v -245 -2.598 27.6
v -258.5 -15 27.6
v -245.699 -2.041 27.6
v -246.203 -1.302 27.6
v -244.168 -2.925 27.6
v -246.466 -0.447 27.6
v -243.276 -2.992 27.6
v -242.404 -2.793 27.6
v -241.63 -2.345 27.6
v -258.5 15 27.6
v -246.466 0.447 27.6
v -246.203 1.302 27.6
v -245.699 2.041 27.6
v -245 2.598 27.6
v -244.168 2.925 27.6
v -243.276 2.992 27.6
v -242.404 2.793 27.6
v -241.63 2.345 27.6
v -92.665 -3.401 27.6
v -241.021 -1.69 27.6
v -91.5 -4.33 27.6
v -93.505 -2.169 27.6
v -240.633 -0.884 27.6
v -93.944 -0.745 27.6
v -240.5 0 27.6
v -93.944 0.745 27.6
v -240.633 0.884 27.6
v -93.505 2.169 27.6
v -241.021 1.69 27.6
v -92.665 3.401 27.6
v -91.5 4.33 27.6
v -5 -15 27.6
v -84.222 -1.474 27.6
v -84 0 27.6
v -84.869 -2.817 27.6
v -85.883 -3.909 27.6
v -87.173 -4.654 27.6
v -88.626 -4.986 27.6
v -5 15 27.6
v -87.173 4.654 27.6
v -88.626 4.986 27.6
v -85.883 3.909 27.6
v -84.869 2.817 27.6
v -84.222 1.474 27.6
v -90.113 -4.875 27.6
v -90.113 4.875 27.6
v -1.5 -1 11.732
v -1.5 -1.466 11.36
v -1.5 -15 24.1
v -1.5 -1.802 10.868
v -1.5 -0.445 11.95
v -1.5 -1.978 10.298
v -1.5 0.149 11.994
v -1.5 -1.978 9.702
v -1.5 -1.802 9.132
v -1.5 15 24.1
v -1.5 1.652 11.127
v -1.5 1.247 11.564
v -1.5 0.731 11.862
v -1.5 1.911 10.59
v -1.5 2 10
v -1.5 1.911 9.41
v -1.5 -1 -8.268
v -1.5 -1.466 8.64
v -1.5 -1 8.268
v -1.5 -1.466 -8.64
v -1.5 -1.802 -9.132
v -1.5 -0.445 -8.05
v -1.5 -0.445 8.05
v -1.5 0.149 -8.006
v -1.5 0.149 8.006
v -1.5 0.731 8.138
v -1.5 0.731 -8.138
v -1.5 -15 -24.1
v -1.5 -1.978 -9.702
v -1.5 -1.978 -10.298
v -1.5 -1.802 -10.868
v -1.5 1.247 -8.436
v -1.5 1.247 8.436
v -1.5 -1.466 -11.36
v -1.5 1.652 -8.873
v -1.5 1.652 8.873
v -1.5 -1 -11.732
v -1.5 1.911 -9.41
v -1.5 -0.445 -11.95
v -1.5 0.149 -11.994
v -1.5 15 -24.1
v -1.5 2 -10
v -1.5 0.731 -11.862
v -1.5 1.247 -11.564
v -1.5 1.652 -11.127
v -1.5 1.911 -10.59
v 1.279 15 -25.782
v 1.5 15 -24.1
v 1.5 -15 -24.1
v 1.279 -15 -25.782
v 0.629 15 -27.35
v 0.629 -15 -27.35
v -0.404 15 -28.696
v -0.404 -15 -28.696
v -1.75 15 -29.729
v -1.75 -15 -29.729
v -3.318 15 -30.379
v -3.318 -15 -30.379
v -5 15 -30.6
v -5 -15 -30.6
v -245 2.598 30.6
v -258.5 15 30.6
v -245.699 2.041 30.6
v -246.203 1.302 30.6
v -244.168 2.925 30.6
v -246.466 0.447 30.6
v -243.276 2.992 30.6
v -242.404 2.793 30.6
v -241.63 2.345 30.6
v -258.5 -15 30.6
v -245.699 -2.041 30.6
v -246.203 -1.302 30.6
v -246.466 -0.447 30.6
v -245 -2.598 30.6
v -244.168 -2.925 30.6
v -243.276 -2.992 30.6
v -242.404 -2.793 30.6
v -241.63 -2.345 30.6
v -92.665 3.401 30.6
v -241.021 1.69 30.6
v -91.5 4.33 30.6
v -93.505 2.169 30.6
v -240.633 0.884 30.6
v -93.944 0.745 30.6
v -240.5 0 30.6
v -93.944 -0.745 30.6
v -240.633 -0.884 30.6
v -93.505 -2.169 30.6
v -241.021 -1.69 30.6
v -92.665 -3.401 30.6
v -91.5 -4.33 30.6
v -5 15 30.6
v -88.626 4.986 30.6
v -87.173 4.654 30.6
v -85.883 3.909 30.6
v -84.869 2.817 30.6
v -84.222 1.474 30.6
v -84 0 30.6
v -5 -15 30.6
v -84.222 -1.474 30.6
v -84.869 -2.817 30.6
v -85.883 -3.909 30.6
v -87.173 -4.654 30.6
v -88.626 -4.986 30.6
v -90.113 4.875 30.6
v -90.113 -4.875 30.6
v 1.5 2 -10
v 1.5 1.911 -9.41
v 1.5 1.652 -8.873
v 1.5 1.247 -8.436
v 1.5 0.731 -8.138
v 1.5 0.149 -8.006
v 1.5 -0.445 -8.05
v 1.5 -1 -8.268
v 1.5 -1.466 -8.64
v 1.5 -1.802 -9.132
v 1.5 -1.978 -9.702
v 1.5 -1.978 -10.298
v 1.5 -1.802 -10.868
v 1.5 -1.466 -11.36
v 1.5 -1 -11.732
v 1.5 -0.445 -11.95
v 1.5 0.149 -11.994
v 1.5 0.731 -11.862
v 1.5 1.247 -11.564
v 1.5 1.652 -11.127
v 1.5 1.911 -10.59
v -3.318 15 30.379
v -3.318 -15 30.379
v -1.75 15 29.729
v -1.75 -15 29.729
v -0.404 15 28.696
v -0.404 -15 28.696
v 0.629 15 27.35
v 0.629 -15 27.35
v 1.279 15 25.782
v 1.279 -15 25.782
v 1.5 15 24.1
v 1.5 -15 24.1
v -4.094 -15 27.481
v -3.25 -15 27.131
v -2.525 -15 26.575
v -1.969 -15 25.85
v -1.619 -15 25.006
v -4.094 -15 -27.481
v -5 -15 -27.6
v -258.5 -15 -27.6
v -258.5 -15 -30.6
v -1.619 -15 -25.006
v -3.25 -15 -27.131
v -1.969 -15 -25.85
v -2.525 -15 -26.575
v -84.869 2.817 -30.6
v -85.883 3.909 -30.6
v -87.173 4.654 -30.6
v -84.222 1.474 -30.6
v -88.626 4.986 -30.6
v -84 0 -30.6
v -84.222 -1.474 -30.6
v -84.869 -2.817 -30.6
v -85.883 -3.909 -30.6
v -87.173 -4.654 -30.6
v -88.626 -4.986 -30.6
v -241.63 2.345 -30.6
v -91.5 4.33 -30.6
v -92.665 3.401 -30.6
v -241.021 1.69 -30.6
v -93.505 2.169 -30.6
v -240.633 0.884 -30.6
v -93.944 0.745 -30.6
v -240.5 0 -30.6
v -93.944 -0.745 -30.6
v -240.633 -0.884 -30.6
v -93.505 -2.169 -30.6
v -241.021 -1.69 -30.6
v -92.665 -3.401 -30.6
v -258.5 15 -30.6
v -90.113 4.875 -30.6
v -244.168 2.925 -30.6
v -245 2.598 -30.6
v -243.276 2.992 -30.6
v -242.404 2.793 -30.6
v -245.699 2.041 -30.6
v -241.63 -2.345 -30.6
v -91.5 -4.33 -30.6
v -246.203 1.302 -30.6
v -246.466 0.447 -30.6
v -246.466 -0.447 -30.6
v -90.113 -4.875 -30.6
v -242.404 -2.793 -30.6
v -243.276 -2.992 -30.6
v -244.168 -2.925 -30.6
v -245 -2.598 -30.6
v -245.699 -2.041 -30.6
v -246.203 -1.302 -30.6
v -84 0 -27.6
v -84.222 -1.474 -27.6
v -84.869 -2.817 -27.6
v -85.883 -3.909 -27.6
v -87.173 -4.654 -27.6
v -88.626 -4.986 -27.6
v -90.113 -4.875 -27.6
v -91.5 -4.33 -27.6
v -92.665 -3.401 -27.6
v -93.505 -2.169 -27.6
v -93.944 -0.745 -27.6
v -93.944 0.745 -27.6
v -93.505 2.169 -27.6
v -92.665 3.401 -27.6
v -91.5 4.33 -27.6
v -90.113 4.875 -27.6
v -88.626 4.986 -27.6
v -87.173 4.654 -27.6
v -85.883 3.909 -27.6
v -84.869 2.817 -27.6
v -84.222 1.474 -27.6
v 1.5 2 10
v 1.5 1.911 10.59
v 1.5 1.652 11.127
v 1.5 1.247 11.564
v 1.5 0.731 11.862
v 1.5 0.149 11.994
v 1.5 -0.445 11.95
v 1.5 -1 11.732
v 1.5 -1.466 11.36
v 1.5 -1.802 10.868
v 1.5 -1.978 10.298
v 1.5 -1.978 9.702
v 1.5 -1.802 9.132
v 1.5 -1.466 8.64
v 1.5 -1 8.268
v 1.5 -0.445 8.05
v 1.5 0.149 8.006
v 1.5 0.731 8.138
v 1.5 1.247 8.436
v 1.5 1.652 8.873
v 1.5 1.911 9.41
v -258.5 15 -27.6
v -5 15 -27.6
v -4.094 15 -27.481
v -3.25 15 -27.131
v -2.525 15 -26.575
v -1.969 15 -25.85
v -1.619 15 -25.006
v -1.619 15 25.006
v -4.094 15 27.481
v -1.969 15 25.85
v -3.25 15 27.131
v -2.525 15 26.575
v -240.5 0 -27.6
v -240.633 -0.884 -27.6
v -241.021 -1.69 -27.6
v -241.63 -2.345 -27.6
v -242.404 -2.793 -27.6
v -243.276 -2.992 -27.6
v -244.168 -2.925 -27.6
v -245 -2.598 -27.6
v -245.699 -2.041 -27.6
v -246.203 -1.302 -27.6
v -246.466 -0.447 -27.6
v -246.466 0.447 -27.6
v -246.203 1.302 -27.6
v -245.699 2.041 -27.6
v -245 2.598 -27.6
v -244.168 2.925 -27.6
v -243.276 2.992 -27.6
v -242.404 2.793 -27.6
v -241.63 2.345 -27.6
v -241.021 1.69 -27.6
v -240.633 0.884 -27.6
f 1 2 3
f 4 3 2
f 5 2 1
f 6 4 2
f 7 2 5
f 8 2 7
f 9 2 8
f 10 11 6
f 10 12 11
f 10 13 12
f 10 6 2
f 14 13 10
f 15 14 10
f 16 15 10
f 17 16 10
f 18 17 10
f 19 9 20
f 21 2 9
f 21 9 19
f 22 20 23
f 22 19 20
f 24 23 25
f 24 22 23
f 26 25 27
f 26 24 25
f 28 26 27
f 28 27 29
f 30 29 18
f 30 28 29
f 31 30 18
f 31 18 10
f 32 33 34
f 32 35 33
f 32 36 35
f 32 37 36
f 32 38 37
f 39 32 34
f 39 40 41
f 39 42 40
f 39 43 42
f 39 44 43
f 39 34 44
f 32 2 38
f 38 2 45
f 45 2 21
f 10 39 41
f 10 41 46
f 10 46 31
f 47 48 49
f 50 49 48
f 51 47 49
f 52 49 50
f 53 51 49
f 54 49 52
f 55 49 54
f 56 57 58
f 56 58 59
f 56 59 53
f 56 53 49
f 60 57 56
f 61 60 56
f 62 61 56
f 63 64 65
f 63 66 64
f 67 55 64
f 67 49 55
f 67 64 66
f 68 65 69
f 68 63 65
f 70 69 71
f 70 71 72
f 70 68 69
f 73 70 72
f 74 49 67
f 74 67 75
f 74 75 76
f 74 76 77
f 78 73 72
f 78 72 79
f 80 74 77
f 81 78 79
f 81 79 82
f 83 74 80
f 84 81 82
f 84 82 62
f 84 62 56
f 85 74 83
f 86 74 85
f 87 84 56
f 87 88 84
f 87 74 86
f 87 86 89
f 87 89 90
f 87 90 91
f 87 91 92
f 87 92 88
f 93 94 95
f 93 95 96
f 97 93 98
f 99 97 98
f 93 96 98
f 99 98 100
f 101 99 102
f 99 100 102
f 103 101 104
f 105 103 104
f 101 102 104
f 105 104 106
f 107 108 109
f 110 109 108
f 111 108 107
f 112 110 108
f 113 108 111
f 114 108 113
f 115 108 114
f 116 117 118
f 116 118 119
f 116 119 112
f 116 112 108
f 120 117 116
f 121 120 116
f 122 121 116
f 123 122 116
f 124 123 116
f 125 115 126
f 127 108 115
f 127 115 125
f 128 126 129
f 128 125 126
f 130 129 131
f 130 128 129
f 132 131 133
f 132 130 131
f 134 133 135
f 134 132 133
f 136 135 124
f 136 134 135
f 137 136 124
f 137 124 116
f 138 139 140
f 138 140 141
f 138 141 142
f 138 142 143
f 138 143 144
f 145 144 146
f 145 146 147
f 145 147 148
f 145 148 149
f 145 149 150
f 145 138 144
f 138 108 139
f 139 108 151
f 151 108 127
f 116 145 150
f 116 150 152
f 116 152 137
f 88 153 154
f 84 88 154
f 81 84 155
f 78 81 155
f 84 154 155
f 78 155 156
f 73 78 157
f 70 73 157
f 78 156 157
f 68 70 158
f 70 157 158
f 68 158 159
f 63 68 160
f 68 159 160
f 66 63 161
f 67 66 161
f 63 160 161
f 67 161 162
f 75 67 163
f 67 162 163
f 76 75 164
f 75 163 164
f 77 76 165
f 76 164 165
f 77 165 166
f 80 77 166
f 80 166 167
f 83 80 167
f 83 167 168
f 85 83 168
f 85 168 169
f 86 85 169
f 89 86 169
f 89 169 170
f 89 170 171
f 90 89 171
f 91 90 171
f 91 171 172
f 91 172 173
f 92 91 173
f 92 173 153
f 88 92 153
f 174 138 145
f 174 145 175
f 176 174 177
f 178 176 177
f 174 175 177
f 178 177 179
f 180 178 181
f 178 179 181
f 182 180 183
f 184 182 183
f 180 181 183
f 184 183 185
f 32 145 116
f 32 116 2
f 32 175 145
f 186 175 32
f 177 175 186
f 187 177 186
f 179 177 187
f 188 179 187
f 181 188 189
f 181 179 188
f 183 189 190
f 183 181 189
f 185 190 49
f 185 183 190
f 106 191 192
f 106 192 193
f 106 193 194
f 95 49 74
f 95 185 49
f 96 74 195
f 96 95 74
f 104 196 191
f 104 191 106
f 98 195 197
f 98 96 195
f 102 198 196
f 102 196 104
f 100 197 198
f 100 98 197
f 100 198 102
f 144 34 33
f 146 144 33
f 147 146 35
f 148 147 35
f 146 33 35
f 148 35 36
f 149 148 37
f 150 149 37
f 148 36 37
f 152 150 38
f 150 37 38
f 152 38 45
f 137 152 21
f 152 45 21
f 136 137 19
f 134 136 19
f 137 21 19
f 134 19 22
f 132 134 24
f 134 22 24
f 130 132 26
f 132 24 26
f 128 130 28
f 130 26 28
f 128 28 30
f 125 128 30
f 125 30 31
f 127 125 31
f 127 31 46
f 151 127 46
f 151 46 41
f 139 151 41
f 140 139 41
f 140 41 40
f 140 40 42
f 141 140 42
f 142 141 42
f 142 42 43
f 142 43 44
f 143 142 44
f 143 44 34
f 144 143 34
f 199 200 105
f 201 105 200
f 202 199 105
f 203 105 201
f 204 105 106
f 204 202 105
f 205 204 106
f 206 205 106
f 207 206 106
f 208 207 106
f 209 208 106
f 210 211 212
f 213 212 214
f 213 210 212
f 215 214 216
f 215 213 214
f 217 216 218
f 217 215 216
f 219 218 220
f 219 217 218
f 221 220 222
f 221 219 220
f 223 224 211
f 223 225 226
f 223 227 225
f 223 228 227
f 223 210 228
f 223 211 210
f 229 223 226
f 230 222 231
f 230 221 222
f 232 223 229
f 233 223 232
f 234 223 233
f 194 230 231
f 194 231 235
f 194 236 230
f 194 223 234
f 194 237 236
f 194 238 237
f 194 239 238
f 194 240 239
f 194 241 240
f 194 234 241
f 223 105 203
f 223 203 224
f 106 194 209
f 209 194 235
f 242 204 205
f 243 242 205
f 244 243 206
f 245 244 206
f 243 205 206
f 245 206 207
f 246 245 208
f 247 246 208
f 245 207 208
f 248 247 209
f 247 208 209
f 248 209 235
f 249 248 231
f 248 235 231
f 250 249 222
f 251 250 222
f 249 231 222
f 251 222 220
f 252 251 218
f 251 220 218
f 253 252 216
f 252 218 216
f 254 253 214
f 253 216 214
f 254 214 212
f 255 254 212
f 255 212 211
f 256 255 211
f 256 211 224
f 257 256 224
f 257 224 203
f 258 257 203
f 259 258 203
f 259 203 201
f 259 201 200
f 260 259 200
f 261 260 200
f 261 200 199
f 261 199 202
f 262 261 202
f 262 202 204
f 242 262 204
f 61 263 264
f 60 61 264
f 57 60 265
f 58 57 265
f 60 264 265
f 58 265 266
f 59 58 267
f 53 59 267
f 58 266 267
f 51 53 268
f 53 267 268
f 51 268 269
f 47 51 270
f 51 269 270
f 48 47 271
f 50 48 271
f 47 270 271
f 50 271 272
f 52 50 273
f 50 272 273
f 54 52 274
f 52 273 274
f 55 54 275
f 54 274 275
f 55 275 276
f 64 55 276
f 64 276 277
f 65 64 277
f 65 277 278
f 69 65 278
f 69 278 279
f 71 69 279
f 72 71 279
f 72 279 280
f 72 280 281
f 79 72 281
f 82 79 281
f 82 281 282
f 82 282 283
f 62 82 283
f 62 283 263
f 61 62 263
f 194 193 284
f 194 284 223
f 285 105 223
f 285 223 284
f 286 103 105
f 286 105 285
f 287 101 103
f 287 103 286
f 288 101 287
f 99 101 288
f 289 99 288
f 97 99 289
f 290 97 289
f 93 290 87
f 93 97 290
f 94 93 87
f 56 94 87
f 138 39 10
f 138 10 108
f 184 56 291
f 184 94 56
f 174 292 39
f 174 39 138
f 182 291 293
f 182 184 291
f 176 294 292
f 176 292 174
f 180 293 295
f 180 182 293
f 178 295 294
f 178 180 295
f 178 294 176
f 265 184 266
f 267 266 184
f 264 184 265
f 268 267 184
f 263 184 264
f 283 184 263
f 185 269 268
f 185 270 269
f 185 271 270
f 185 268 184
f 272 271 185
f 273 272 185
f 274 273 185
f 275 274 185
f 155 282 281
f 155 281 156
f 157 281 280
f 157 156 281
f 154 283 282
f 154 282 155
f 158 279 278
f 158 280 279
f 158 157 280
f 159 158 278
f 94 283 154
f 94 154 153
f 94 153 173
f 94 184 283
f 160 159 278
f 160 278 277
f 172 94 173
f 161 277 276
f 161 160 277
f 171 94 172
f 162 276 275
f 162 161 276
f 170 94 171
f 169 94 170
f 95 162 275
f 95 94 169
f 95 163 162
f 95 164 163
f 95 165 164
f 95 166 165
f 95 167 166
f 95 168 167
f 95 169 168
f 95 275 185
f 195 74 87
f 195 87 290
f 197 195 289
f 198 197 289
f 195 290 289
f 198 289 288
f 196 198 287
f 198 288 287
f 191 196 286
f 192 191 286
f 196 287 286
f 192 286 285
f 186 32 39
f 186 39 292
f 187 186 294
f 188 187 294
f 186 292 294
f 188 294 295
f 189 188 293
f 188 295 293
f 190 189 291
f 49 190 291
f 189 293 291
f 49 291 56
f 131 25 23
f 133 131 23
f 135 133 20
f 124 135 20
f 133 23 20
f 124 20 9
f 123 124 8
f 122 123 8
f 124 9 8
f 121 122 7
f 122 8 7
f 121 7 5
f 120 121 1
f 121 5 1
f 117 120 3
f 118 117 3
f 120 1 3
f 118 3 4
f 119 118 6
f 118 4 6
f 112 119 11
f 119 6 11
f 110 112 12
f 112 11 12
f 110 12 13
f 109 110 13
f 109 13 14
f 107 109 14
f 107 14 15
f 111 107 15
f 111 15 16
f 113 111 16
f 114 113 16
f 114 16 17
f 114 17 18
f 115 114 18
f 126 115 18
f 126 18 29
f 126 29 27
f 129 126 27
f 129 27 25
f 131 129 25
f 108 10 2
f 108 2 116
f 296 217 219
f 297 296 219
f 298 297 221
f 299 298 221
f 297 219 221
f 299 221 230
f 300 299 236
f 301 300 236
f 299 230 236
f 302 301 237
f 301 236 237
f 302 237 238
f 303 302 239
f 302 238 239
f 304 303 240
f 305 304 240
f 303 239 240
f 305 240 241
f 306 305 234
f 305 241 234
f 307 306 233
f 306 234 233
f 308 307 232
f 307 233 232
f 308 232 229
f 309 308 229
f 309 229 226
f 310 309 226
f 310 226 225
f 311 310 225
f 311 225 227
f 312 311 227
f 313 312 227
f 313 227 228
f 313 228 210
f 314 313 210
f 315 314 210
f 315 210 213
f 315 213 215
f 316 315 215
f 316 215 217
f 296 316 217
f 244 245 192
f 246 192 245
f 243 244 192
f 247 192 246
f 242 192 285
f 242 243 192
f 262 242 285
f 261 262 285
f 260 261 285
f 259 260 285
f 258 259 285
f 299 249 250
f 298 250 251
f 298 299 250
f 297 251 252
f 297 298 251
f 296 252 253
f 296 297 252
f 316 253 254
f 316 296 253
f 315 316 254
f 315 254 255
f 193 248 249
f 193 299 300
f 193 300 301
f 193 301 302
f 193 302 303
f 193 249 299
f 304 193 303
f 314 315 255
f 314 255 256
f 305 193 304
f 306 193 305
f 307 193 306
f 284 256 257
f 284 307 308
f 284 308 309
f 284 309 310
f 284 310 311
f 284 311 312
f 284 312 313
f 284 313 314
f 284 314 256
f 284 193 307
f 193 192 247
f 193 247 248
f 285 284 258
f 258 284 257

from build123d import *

# Parameters (mm, degrees)
F2_W     = 30
F2_H     = 3
F4_R     = 5
F5_DEPTH = 61.201
F6_R     = 2
F7_DEPTH = 260.001
F8_R     = 3
F9_DEPTH = 61.201


with BuildPart() as f3:
    # F3: sweep along a path in F0
    with BuildLine(Plane.XZ) as f3_path:
        Line((-258.5, 29.1), (-5, 29.1))
        ThreePointArc((-5, 29.1), (-1.4644660941, 27.6355339059), (0, 24.1))
        Line((0, 24.1), (0, -24.1))
        ThreePointArc((0, -24.1), (-1.4644660941, -27.6355339059), (-5, -29.1))
        Line((-5, -29.1), (-258.5, -29.1))
    # F2 (on plane+point) → F3 (sweep)
    with BuildSketch(Plane.YZ.offset(-258.5)):
        with Locations((0, 29.1)):
            Rectangle(F2_W, F2_H)
    sweep(path=f3_path.line)

    # F4 (on face) → F5 (cut, through all)
    with BuildSketch(Plane(origin=(0, 0, -30.6), x_dir=(1, 0, 0), z_dir=(0, 0, -1))):
        with Locations((-89, 0)):
            Circle(F4_R)
    extrude(amount=-F5_DEPTH, mode=Mode.SUBTRACT)

    # F6 (on face) → F7 (cut, through all)
    with BuildSketch(Plane.YZ.offset(1.5)):
        with Locations((0, 10)):
            Circle(F6_R)
        with Locations((0, -10)):
            Circle(F6_R)
    extrude(amount=-F7_DEPTH, mode=Mode.SUBTRACT)

    # F8 (on face) → F9 (cut, through all)
    with BuildSketch(Plane(origin=(0, 0, -30.6), x_dir=(1, 0, 0), z_dir=(0, 0, -1))):
        with Locations((-243.5, 0)):
            Circle(F8_R)
    extrude(amount=-F9_DEPTH, mode=Mode.SUBTRACT)


solid = f3.part
